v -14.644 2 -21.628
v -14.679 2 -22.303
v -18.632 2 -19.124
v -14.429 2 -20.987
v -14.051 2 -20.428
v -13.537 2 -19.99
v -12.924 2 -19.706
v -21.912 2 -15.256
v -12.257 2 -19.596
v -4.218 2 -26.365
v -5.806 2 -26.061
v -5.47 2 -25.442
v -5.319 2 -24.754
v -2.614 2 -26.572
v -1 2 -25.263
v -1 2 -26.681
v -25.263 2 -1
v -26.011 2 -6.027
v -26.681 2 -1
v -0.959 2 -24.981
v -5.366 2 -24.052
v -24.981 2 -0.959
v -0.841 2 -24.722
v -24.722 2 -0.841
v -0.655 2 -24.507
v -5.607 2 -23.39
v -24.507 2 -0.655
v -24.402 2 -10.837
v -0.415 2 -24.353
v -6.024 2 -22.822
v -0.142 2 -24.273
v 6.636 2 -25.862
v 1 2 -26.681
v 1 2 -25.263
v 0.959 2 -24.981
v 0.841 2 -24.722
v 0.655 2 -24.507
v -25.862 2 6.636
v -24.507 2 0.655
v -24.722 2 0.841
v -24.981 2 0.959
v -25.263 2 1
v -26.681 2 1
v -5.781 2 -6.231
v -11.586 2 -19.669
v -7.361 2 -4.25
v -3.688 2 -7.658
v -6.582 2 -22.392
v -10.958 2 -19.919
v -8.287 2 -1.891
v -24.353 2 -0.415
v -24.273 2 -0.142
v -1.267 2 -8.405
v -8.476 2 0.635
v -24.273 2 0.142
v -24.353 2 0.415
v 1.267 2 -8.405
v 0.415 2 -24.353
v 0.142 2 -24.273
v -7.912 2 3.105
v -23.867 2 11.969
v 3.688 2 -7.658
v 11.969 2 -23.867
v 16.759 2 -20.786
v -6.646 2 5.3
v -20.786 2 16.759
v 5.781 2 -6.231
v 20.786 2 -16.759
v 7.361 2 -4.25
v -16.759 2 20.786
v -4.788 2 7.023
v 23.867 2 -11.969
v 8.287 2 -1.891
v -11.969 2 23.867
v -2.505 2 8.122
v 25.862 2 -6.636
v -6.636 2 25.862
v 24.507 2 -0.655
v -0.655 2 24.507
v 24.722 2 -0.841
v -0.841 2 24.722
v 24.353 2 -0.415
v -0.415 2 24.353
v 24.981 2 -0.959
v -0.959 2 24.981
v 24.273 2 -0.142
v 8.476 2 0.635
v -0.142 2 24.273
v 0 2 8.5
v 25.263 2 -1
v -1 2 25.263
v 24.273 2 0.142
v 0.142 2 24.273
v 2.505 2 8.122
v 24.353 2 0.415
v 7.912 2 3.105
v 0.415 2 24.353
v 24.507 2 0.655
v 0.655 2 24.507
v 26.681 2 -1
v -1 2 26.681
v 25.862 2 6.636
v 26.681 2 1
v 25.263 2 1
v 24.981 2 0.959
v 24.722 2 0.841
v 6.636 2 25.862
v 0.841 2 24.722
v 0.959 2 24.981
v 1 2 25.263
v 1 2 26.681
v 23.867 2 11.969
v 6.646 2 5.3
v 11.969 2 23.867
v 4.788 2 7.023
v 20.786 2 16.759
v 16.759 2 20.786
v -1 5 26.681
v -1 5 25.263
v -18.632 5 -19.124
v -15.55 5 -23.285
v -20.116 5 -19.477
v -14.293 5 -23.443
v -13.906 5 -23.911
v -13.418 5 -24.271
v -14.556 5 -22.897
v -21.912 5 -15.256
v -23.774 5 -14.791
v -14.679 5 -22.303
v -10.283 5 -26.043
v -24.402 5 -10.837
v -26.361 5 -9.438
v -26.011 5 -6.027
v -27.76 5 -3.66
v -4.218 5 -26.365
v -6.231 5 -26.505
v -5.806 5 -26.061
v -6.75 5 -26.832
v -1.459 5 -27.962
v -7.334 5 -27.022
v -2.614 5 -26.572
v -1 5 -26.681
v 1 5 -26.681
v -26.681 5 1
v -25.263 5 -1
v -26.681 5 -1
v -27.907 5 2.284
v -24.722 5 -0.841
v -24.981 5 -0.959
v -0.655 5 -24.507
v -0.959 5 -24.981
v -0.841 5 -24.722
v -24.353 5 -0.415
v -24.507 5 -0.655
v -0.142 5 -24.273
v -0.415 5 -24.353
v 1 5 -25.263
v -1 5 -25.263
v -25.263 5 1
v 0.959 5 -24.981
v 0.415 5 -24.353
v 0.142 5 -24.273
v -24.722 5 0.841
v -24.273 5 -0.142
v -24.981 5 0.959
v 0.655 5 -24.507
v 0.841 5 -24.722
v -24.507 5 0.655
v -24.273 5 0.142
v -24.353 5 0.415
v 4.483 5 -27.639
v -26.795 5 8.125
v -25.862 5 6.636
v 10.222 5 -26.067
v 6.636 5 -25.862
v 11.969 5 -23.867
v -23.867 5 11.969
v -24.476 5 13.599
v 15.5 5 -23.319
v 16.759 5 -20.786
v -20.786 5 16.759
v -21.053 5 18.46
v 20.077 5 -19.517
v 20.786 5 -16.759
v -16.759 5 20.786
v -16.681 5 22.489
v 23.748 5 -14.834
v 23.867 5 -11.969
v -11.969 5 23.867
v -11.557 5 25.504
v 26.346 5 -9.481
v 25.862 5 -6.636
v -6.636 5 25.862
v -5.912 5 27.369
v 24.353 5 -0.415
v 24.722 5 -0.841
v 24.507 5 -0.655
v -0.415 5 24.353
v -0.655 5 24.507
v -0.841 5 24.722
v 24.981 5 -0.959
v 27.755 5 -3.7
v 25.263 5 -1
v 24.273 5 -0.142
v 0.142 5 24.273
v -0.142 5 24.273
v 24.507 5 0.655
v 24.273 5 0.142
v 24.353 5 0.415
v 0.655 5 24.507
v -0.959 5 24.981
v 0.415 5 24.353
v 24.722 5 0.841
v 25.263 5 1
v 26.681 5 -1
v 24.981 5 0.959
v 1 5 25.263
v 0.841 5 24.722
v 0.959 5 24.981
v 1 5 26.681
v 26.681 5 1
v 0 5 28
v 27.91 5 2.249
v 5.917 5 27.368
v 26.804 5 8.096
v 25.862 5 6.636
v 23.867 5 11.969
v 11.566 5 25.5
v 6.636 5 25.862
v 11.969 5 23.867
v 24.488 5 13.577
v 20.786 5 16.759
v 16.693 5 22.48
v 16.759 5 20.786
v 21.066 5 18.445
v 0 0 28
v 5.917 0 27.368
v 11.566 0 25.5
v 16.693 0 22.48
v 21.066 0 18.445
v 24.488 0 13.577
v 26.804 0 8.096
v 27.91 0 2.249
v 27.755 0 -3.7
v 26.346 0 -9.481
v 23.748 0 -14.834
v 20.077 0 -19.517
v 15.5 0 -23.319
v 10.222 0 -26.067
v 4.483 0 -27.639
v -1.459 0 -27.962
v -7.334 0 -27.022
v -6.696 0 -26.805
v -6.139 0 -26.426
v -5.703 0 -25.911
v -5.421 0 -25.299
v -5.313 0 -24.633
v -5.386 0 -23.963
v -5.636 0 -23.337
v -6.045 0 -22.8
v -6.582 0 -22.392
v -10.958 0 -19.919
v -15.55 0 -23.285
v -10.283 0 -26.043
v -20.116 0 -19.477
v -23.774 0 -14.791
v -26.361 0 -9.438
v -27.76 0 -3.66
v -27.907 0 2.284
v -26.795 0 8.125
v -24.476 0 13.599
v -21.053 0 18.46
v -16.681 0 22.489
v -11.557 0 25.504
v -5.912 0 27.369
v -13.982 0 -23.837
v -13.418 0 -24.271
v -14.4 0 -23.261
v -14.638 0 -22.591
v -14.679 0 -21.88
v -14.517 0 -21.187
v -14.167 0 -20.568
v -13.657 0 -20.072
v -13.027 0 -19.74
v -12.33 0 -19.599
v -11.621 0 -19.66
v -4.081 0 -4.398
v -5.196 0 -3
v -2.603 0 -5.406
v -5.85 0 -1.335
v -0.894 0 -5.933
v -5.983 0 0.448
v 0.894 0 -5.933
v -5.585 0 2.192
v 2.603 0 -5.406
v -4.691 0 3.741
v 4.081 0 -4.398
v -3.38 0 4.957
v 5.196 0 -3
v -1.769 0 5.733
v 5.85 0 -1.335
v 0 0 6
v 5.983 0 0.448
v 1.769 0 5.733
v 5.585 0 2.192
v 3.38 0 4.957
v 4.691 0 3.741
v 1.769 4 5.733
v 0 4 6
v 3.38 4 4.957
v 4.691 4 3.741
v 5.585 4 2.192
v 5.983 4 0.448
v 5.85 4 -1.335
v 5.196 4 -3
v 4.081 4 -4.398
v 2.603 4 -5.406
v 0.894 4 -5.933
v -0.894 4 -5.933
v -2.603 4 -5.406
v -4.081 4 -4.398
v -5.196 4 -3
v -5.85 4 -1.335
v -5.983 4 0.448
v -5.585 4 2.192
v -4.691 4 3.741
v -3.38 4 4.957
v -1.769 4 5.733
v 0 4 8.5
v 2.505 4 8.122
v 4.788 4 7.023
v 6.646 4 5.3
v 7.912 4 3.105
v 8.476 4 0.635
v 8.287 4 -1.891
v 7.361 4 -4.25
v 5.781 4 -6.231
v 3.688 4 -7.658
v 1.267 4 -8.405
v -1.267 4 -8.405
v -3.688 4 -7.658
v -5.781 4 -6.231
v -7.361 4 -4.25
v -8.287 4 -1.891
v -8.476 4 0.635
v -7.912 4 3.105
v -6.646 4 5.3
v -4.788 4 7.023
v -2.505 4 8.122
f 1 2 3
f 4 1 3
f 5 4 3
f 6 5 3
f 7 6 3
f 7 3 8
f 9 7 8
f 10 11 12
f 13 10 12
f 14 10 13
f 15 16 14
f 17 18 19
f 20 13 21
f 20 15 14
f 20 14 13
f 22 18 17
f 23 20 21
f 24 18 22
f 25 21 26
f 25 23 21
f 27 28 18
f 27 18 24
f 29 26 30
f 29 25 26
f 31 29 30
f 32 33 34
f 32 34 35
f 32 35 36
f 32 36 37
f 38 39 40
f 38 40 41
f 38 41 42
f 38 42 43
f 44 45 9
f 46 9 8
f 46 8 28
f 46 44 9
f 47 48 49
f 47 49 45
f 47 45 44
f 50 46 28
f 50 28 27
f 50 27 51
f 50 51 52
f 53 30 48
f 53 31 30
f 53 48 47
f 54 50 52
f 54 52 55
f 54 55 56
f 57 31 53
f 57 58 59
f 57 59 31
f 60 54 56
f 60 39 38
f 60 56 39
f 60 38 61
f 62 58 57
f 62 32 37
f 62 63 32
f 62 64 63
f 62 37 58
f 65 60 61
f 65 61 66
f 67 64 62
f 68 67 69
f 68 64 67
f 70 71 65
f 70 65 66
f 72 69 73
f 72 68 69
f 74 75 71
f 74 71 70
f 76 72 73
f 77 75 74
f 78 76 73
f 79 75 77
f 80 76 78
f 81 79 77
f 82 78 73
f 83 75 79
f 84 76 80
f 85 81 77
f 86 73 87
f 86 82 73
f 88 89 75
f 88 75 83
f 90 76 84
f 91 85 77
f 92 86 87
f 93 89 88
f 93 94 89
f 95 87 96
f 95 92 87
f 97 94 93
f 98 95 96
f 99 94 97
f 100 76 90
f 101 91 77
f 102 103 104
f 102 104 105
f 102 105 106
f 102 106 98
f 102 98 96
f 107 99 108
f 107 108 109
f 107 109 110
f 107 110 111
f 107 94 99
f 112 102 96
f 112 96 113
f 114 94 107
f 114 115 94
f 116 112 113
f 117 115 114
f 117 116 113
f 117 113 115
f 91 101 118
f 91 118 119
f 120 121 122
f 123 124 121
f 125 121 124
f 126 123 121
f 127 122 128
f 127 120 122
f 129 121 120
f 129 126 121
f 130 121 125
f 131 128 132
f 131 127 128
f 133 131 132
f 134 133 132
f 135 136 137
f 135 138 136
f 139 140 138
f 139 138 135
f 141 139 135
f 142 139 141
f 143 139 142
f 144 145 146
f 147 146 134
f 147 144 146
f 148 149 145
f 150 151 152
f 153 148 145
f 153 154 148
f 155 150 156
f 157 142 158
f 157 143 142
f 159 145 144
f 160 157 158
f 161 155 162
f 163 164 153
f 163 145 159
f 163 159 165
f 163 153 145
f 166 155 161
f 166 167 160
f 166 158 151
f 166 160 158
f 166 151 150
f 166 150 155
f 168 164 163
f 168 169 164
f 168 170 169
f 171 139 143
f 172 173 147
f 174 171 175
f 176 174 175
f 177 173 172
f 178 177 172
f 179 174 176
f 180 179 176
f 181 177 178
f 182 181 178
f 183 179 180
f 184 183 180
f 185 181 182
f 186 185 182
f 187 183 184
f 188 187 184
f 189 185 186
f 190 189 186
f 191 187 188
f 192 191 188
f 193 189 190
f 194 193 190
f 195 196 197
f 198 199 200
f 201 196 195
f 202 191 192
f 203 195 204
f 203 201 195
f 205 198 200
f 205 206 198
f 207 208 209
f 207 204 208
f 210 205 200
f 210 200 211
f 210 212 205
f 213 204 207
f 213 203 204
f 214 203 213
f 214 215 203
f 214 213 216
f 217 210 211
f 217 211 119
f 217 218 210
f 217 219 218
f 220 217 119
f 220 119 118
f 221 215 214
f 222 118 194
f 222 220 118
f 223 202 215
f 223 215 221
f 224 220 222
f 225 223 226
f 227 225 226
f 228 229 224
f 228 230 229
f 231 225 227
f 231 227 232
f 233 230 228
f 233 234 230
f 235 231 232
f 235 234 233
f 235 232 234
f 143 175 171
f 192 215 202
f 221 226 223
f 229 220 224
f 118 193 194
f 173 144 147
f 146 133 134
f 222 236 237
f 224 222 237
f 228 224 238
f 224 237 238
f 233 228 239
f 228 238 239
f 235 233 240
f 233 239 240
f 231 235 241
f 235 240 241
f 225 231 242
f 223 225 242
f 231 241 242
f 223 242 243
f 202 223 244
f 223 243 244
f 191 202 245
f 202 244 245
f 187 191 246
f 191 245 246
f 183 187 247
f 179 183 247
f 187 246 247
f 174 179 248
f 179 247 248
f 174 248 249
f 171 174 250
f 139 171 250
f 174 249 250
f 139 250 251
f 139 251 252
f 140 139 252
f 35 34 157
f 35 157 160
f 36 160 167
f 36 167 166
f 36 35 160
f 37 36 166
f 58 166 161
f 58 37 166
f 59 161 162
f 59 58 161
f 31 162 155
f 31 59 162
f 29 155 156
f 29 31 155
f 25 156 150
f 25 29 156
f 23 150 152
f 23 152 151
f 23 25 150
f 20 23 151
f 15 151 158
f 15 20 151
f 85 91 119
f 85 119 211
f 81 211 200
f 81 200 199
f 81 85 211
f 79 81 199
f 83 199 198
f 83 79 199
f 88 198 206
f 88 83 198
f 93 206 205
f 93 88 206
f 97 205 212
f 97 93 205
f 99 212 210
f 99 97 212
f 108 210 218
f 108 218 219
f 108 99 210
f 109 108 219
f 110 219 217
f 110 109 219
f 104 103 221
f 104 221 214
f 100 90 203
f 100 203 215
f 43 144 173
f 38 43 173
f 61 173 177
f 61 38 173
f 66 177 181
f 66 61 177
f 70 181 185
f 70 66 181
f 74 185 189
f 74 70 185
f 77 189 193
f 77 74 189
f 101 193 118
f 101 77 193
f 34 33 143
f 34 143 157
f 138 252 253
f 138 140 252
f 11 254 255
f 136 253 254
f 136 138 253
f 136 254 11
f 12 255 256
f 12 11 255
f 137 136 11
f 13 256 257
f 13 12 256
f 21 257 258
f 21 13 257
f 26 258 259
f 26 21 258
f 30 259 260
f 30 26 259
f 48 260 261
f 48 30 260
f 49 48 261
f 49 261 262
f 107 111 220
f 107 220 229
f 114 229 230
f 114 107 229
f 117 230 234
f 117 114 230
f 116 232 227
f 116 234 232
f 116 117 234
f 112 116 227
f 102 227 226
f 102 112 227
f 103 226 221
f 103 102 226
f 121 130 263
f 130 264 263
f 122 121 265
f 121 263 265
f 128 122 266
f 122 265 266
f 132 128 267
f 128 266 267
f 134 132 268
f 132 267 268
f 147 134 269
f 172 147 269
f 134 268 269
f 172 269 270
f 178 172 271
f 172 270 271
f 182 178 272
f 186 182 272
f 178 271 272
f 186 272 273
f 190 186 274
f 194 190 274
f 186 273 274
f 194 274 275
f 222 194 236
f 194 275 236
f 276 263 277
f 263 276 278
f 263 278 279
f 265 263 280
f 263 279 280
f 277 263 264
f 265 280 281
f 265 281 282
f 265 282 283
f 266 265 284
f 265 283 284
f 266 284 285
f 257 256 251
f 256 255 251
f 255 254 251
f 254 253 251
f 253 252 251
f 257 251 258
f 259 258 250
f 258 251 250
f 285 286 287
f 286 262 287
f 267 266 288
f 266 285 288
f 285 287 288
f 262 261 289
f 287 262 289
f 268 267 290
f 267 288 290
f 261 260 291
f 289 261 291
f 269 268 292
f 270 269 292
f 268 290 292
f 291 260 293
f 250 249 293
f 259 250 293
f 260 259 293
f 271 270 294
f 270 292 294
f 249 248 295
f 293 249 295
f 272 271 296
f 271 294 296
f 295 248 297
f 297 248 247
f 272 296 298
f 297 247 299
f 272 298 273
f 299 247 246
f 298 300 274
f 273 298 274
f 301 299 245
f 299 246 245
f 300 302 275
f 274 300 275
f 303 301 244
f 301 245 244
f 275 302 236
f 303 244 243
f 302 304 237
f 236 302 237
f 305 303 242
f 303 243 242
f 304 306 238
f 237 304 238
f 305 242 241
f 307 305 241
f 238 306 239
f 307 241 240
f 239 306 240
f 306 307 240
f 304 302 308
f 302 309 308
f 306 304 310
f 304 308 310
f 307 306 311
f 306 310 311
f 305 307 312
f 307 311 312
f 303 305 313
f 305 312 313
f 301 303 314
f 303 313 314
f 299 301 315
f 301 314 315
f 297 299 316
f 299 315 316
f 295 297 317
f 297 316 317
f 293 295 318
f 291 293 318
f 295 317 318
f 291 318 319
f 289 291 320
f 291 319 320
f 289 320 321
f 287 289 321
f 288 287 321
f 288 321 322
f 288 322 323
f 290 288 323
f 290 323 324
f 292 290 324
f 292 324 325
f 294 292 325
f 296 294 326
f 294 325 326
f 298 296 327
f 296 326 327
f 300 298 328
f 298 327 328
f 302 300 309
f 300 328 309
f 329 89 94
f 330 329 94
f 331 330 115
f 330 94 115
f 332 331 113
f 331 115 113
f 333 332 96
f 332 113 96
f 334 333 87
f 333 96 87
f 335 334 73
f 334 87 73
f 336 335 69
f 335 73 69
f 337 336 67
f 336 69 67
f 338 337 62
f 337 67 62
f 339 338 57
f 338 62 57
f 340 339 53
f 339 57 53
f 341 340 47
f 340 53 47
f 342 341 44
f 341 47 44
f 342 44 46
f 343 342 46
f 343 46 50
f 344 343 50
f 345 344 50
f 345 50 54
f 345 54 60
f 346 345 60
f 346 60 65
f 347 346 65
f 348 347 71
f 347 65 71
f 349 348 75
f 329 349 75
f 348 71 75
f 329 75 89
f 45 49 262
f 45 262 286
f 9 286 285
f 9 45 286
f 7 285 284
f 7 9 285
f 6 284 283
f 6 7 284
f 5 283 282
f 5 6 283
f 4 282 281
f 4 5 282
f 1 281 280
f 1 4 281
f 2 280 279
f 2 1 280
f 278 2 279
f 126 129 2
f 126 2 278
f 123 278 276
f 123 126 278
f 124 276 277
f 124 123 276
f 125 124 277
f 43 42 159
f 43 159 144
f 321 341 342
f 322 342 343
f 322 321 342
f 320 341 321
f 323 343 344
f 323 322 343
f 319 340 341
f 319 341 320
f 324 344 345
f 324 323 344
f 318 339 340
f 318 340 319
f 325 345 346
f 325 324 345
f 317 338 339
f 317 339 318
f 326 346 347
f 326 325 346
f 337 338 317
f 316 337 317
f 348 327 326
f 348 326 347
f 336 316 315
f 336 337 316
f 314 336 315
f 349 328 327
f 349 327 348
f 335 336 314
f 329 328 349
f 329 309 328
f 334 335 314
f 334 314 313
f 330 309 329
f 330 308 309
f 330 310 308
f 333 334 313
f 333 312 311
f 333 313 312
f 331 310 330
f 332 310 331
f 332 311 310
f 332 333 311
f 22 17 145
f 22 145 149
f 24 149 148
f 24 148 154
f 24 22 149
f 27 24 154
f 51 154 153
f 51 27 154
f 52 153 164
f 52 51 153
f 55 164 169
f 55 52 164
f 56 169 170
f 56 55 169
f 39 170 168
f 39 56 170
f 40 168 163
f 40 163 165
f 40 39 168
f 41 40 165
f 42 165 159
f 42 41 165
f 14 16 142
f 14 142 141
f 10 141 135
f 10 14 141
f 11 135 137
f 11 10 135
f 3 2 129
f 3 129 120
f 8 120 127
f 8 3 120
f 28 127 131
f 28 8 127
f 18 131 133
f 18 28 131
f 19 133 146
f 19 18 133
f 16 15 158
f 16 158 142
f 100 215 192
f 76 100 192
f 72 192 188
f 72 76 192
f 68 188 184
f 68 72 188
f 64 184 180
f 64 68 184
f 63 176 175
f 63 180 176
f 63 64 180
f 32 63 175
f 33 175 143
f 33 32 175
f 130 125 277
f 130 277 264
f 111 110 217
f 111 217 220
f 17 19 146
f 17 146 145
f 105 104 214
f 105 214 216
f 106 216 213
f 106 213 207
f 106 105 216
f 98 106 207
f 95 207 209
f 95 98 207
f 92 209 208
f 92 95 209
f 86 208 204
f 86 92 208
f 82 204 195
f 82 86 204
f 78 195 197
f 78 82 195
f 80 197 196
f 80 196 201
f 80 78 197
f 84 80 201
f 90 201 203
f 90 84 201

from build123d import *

# Parameters (mm, degrees)
SKETCH_1_R               = 28
EXTRUDE_1_DEPTH          = 2
SKETCH_2_R               = 28
SKETCH_2_R_2             = 26.7
EXTRUDE_3_DEPTH          = 3
EXTRUDE_4_DEPTH          = 3
PATTERN_CIRCULAR_1_COUNT = 4
CUT_EXTRUDE_1_DEPTH      = 5
SKETCH_5_R               = 8.5
SKETCH_5_R_2             = 6
EXTRUDE_5_DEPTH          = 2
SKETCH_6_R               = 6
CUT_EXTRUDE_2_DEPTH      = 2.5


with BuildPart() as part:
    # 草图1 → 凸台-拉伸1 (new body)
    with BuildSketch(Plane(origin=(0, 0, 0), x_dir=(1, 0, 0), z_dir=(0, 1, 0))):
        with Locations(Location((0, 0, 0), (0, 0, 270))):
            Circle(SKETCH_1_R)
    extrude(amount=EXTRUDE_1_DEPTH)

    # 草图2 → 凸台-拉伸3 (add)
    with BuildSketch(Plane(origin=(0, 2, 0), x_dir=(1, 0, 0), z_dir=(0, 1, 0))):
        with Locations(Location((0, 0, 0), (0, 0, 270))):
            Circle(SKETCH_2_R)
        with Locations(Location((0, 0, 0), (0, 0, 270))):
            Circle(SKETCH_2_R_2, mode=Mode.SUBTRACT)
    extrude(amount=EXTRUDE_3_DEPTH)

    # 草图3 → 凸台-拉伸4 (add)
    with BuildSketch(Plane(origin=(0, 2, 0), x_dir=(1, 0, 0), z_dir=(0, 1, 0))):
        with BuildLine():
            Line((1, 26.681266836), (1, 25.262759823))
            ThreePointArc((1, 25.262759823), (0, 24.262759823), (-1, 25.262759823))
            Line((-1, 25.262759823), (-1, 26.681266836))
            ThreePointArc((-1, 26.681266836), (0, 26.7), (1, 26.681266836))
        make_face()
    extrude_4 = extrude(amount=EXTRUDE_4_DEPTH)

    # 阵列(圆周)1: 凸台-拉伸4 ×4 about axis
    pattern_circular_1_axis = Axis((0, 0, 0), (0, 1, 0))
    for i in range(1, PATTERN_CIRCULAR_1_COUNT):
        add(extrude_4.rotate(pattern_circular_1_axis, i * 360 / PATTERN_CIRCULAR_1_COUNT))

    # 草图4 → 切除-拉伸1 (cut, symmetric)
    with BuildSketch(Plane(origin=(0, 2, 0), x_dir=(1, 0, 0), z_dir=(0, 1, 0))):
        with BuildLine():
            Line((-13.418233233, 24.2713603), (-9.042053051, 26.744853446))
            ThreePointArc((-9.042053051, 26.744853446), (-5.635502812, 25.798589491), (-6.581766767, 22.392039253))
            Line((-6.581766767, 22.392039253), (-10.957946949, 19.918546106))
            ThreePointArc((-10.957946949, 19.918546106), (-14.364497188, 20.864810061), (-13.418233233, 24.2713603))
        make_face()
    extrude(amount=CUT_EXTRUDE_1_DEPTH, both=True, mode=Mode.SUBTRACT)

    # 草图5 → 凸台-拉伸5 (add)
    with BuildSketch(Plane(origin=(0, 2, 0), x_dir=(1, 0, 0), z_dir=(0, 1, 0))):
        with Locations(Location((0, 0, 0), (0, 0, 270))):
            Circle(SKETCH_5_R)
        with Locations(Location((0, 0, 0), (0, 0, 270))):
            Circle(SKETCH_5_R_2, mode=Mode.SUBTRACT)
    extrude(amount=EXTRUDE_5_DEPTH)

    # 草图6 → 切除-拉伸2 (cut, symmetric)
    with BuildSketch(Plane(origin=(0, 2, 0), x_dir=(1, 0, 0), z_dir=(0, 1, 0))):
        with Locations(Location((0, 0, 0), (0, 0, 270))):
            Circle(SKETCH_6_R)
    extrude(amount=CUT_EXTRUDE_2_DEPTH, both=True, mode=Mode.SUBTRACT)


solid = part.part
